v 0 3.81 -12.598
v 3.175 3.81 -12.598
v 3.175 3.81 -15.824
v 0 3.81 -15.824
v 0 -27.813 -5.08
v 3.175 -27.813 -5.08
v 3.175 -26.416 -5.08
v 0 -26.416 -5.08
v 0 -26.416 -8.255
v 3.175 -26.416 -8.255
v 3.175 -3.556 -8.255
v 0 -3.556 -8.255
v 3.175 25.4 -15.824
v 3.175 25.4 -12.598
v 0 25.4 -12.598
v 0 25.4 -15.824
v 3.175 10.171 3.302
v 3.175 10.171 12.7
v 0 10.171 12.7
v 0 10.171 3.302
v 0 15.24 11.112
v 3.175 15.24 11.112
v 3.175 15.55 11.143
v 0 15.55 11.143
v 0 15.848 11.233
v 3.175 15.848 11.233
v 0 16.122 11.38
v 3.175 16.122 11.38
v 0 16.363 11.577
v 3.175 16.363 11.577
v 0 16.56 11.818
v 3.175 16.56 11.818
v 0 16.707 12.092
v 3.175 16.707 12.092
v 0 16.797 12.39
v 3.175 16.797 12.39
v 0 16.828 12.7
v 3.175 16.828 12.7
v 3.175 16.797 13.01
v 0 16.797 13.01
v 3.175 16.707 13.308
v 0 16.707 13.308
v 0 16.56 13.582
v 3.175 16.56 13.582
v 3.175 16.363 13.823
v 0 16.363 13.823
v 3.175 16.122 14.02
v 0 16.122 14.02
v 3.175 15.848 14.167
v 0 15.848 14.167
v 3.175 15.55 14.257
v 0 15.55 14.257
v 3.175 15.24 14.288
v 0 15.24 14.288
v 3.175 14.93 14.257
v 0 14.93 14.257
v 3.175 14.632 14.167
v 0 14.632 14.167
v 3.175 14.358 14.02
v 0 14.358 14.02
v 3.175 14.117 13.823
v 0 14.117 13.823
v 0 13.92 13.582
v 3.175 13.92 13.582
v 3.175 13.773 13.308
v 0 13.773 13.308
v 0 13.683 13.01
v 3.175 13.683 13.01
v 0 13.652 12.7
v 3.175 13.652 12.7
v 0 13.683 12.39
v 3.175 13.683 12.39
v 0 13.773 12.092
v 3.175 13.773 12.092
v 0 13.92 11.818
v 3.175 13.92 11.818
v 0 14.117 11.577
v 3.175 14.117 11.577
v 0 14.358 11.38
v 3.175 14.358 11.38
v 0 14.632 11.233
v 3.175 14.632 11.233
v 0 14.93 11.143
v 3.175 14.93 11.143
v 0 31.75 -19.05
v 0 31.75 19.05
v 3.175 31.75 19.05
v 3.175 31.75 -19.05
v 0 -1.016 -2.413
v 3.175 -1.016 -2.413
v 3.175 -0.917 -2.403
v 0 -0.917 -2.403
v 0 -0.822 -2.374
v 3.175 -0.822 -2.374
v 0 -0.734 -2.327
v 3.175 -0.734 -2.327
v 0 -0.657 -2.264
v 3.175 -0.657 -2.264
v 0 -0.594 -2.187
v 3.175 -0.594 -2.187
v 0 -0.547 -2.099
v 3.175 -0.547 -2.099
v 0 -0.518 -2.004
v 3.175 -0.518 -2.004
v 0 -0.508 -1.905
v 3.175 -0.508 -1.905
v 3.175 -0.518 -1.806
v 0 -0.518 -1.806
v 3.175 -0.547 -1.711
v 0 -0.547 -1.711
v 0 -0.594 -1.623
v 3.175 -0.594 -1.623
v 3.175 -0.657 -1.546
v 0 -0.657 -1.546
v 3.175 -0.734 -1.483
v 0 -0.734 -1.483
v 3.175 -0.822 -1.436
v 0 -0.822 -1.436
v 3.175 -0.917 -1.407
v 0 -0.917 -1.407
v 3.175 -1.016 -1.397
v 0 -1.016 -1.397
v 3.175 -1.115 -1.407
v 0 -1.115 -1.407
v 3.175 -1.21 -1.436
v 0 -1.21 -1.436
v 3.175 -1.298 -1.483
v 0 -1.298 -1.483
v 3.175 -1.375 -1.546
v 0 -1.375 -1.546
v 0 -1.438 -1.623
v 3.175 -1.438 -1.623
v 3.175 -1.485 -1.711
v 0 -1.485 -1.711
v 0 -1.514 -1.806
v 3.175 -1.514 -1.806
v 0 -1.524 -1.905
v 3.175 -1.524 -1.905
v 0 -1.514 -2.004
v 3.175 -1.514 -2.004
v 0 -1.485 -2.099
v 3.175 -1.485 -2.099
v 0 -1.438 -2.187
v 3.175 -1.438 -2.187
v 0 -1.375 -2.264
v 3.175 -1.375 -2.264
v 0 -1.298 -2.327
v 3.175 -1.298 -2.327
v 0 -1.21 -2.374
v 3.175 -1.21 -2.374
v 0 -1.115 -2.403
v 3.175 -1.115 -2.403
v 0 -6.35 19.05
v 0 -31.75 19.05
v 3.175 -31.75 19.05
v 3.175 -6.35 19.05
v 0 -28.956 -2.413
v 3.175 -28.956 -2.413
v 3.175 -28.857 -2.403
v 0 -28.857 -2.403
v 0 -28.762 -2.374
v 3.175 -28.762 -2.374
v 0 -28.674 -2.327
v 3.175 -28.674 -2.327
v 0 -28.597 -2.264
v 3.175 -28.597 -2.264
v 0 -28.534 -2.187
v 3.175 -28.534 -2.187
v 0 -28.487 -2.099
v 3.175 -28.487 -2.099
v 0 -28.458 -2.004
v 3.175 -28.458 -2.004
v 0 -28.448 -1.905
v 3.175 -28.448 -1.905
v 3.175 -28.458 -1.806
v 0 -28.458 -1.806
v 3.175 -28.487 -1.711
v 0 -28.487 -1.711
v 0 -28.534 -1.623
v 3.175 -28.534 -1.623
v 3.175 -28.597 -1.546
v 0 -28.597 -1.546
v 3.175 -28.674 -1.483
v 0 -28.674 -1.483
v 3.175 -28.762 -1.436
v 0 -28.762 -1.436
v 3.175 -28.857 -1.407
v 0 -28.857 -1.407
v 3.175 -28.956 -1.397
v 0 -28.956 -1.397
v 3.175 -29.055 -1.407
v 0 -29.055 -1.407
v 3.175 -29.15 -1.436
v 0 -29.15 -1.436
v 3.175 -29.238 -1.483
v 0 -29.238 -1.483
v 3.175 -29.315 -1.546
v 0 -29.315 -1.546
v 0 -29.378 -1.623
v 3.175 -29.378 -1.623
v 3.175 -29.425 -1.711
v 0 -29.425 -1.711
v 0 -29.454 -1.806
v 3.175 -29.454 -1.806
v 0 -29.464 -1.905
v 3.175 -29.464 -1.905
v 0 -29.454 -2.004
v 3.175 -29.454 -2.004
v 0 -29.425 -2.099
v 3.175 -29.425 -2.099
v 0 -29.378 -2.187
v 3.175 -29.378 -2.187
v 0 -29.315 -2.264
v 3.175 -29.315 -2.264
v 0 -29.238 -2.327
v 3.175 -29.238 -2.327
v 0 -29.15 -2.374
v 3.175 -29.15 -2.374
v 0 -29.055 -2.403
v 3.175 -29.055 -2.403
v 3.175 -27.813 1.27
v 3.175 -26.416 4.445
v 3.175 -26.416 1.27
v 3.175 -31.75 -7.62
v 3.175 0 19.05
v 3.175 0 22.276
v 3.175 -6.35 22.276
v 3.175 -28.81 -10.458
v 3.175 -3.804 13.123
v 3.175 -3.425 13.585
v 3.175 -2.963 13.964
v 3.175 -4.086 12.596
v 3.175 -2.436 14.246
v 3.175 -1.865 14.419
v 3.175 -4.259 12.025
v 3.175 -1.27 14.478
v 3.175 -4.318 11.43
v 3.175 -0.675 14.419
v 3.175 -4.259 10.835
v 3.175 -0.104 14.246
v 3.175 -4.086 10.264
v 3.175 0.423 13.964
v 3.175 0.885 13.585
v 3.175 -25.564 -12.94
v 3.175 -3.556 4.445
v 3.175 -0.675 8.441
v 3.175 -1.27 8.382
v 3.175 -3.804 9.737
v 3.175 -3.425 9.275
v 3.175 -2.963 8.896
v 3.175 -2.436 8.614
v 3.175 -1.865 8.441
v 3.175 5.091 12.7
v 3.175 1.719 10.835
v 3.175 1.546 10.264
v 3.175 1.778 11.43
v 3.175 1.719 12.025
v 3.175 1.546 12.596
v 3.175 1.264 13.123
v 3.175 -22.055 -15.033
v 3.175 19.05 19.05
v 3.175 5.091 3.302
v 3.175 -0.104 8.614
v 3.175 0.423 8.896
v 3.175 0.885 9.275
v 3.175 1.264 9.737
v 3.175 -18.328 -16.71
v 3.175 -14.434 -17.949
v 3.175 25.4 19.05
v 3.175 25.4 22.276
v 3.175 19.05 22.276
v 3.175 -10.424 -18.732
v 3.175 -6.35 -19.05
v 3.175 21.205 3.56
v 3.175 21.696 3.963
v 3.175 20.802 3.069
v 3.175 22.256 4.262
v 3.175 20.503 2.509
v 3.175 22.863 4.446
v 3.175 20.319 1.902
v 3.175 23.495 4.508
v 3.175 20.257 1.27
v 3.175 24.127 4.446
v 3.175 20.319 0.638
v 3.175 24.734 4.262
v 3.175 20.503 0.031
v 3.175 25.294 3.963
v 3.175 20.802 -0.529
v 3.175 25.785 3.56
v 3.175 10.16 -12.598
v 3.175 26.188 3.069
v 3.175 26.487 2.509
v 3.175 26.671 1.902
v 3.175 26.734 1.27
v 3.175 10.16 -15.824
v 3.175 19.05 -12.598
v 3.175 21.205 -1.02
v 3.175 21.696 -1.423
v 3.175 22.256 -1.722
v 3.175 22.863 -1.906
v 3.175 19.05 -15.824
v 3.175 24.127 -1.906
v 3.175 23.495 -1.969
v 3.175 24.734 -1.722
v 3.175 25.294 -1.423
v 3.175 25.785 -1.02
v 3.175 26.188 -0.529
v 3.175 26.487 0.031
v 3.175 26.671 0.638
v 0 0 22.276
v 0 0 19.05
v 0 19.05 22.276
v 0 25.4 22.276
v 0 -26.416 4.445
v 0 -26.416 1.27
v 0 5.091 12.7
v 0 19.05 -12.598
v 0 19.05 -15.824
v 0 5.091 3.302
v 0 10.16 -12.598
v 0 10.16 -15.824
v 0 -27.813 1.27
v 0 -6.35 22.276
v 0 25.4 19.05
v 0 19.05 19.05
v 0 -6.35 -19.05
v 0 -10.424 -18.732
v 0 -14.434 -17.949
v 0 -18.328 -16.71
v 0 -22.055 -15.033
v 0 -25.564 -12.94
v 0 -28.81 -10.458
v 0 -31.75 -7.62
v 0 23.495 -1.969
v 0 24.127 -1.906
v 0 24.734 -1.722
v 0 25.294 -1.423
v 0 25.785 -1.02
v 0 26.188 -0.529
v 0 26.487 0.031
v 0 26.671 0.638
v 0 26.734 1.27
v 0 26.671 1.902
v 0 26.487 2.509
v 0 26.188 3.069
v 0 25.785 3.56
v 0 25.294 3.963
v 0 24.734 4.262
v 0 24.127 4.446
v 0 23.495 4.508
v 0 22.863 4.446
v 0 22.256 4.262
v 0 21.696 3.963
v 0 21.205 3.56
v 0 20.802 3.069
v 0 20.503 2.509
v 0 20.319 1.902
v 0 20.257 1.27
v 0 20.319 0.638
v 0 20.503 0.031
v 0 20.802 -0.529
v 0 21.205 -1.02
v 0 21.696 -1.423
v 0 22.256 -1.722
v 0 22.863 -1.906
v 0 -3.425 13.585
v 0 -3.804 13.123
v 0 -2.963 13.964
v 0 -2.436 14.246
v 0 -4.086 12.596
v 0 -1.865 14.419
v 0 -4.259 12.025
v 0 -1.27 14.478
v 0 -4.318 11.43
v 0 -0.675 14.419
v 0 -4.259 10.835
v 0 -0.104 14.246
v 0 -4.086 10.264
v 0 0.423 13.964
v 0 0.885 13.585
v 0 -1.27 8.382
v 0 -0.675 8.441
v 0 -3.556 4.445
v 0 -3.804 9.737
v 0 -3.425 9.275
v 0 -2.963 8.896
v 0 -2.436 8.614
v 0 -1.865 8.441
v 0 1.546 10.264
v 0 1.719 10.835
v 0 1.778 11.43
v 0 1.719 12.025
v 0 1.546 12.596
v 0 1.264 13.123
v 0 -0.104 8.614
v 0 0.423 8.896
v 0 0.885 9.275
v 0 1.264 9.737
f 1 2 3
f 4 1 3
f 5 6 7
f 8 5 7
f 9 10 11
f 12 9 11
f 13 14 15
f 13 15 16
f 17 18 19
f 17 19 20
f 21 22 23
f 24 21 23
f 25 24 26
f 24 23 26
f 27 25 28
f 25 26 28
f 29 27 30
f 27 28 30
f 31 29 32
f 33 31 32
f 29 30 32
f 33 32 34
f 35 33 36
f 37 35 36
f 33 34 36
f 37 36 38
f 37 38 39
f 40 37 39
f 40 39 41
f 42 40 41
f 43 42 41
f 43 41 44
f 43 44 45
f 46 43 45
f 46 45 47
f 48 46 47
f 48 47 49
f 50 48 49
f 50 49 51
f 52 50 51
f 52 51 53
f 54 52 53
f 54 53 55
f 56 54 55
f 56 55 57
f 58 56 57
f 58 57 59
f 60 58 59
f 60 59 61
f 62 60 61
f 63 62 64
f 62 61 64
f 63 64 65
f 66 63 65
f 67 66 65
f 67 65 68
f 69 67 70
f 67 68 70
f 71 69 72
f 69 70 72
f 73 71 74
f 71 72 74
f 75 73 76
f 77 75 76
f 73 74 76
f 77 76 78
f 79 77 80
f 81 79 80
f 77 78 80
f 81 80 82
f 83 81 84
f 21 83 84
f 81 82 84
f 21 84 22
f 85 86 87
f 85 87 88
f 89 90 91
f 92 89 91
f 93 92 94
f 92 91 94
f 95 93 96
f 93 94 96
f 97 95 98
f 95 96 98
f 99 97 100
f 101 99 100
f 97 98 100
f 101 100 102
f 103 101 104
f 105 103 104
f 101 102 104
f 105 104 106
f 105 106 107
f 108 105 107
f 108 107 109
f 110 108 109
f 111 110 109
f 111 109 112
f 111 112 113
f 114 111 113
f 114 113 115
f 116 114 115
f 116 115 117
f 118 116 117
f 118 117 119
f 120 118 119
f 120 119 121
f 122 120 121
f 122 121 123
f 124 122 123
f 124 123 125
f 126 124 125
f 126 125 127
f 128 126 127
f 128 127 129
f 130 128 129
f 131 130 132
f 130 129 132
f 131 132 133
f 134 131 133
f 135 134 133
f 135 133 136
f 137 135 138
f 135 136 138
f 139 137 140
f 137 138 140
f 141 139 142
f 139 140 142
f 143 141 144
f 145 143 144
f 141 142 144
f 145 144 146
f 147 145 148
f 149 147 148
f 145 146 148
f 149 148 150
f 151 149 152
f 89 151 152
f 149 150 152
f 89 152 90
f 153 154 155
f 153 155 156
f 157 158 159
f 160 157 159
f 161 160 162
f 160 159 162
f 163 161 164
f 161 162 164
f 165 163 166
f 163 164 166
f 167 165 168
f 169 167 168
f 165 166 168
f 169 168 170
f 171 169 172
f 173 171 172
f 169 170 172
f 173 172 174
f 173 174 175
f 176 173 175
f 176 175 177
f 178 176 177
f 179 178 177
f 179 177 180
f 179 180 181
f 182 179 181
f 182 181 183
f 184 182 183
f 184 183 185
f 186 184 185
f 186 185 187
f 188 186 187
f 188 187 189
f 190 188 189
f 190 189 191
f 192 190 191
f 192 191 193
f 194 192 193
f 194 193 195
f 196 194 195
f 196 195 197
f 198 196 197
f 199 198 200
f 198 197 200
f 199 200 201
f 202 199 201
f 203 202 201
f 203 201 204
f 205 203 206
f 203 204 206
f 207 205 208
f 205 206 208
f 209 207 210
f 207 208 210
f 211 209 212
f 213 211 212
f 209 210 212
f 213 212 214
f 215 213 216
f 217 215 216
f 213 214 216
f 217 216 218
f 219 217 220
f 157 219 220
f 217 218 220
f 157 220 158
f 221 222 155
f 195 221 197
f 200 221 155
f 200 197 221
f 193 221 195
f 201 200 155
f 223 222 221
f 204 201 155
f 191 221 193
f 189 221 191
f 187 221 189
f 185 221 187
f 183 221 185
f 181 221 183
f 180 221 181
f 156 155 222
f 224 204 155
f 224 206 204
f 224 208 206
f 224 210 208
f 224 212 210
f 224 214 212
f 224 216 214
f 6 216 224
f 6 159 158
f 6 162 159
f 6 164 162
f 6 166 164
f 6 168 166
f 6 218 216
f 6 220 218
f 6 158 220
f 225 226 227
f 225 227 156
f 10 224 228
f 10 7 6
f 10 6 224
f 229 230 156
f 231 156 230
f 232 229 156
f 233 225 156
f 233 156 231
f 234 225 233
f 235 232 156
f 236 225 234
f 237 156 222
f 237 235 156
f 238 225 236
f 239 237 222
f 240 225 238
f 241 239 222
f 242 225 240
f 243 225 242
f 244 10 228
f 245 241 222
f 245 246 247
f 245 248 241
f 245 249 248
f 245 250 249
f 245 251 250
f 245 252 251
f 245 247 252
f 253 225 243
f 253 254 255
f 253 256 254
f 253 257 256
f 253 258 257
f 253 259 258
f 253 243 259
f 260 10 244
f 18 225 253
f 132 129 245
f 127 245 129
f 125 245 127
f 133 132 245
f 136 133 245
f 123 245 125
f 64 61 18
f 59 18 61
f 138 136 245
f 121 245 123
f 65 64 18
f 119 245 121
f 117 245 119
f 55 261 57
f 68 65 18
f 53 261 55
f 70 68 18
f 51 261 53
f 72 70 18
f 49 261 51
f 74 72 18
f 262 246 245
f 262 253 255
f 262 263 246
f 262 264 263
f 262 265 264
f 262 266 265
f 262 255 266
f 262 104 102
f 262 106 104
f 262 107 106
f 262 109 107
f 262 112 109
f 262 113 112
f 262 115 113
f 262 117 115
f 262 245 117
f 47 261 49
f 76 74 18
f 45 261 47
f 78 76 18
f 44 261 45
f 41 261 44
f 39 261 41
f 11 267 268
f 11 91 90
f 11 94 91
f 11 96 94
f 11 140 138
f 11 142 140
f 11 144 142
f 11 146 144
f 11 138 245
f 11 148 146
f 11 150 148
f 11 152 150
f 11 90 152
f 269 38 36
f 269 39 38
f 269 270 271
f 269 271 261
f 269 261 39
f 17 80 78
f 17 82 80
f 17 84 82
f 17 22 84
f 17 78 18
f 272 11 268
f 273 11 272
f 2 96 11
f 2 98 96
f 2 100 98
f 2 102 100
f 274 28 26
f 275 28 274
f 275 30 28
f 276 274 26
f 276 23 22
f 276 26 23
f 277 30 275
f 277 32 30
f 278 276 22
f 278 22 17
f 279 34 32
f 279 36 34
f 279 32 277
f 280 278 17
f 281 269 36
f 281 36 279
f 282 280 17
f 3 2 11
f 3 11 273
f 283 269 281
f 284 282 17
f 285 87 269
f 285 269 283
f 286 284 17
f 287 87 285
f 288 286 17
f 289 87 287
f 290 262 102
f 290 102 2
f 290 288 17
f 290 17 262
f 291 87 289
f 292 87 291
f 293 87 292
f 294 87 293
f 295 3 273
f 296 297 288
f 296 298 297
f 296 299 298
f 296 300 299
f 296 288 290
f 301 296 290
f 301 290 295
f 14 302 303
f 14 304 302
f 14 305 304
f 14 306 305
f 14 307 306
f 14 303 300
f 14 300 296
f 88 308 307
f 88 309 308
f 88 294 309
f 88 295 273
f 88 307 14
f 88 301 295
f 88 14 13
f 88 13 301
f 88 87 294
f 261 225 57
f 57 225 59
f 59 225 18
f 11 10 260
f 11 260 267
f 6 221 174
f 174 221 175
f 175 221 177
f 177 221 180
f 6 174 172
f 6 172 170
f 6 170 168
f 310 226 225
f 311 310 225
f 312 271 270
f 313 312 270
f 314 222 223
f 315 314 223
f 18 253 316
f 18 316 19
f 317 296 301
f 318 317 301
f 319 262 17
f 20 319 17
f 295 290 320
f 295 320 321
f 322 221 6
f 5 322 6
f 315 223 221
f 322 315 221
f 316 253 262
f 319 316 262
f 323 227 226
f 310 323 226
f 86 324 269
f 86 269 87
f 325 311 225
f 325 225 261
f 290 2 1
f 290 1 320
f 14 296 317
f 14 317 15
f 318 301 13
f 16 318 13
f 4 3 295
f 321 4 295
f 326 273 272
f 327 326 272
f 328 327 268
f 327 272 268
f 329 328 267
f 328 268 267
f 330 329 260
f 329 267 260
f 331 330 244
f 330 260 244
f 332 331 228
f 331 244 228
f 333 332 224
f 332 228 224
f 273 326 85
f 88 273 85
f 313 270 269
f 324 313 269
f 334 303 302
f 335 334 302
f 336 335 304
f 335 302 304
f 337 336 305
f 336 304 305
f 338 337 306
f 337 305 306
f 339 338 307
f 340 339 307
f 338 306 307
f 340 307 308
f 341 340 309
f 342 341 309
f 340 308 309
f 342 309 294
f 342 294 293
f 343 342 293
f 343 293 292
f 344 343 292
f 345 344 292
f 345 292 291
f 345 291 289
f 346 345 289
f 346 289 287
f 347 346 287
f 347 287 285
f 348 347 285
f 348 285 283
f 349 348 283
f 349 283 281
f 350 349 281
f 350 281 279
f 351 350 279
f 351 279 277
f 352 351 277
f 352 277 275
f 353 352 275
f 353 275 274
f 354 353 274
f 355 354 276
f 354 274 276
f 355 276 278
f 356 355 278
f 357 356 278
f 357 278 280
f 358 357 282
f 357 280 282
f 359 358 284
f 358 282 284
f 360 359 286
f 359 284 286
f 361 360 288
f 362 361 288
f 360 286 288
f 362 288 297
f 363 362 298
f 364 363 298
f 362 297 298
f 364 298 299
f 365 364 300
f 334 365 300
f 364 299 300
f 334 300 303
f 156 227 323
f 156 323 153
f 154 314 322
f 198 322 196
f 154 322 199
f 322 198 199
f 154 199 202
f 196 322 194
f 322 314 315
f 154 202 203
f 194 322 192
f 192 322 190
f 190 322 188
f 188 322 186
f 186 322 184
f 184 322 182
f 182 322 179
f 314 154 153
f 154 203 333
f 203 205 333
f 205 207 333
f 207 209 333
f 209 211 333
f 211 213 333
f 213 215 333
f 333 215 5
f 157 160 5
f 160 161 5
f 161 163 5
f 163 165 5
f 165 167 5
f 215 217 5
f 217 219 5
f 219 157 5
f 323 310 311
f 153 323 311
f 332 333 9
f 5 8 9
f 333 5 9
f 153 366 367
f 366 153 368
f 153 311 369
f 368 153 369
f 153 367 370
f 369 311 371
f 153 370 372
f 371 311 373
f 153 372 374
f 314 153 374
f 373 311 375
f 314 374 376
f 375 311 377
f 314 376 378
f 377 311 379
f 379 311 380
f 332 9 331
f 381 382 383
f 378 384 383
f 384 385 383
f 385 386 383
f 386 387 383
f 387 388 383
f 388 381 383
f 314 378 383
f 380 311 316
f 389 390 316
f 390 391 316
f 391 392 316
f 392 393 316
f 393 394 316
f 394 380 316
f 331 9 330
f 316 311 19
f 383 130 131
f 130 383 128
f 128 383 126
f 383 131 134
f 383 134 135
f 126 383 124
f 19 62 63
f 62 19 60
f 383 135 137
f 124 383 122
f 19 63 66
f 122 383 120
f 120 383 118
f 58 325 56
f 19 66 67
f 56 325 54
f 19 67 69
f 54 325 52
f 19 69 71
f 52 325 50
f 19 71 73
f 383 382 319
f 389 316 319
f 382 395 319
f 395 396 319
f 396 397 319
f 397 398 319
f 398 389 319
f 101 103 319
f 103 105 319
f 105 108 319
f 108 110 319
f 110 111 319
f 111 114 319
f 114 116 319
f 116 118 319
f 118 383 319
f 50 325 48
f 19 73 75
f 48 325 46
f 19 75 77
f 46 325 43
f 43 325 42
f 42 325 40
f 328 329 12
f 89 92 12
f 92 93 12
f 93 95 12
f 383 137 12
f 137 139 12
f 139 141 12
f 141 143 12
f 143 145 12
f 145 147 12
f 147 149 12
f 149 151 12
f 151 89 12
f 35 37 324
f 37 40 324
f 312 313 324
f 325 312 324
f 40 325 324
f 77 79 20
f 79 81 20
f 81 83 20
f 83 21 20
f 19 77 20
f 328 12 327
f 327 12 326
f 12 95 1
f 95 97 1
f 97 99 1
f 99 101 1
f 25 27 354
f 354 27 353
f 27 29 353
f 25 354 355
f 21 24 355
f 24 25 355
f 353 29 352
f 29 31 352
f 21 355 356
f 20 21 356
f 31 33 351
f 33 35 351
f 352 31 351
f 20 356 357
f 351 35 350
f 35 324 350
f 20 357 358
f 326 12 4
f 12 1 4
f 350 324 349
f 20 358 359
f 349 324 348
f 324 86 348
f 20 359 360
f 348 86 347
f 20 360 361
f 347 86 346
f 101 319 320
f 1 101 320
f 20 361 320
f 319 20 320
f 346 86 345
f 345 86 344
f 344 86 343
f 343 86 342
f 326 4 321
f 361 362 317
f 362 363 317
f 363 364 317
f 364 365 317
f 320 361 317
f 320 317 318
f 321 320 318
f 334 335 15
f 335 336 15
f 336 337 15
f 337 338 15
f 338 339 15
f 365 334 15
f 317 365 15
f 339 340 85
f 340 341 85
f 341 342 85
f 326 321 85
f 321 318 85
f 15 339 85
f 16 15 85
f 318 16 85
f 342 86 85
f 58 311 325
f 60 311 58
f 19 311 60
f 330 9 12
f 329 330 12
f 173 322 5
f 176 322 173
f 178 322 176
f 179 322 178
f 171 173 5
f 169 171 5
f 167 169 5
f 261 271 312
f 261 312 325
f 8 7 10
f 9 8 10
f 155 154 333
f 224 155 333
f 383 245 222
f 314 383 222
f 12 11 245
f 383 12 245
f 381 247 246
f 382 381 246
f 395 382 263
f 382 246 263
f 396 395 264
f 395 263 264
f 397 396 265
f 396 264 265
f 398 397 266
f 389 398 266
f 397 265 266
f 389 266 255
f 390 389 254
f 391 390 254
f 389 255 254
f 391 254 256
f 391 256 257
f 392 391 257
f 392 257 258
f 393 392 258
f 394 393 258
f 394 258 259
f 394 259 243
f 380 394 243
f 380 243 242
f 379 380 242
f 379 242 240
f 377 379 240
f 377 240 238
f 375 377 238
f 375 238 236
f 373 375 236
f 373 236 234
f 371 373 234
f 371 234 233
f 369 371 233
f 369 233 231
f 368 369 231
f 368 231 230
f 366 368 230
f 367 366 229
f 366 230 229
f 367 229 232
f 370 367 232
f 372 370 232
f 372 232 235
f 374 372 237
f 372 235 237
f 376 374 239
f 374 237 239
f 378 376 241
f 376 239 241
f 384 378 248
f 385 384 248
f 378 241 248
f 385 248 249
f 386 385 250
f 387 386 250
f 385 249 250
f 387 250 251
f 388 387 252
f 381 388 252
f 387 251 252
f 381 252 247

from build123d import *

# Parameters (mm, degrees)
SKETCH1_W                          = 38.1
SKETCH1_H                          = 63.5
MAIN_BODY_DEPTH                    = 3.175
SKETCH2_W                          = 3.2258
SKETCH2_H                          = 6.35
TABS_DEPTH                         = 3.175
SKETCH5_R                          = 0.508
MOTOR_CUT_DEPTH                    = 4.175
SKETCH6_R                          = 3.2385
CUT_FOR_AXLE_DEPTH                 = 4.175
ROUND_OFF_BACK_CORNER_DEPTH        = 4.175
SKETCH8_W                          = 3.2258
SKETCH8_H                          = 6.35
CUT_FOR_TABS_DEPTH                 = 4.175
SKETCH9_R                          = 1.5875
CUT_FOR_BRACKET_SCREW_DEPTH        = 4.175
SKETCH10_R                         = 3.048
CUT_FOR_BASIC_2ND_MOUNT_AXLE_DEPTH = 4.175
SKETCH11_W                         = 9.398
SKETCH11_H                         = 5.08
CUT_EXTRUDE1_DEPTH                 = 4.175


with BuildPart() as part:
    # Sketch1 → main body (new body)
    with BuildSketch(Plane(origin=(0, 0, 0), x_dir=(0, 0, -1), z_dir=(1, 0, 0))):
        Rectangle(SKETCH1_W, SKETCH1_H)
    extrude(amount=MAIN_BODY_DEPTH)

    # Sketch2 → tabs (add)
    with BuildSketch(Plane(origin=(3.175, 0, 0), x_dir=(0, 0, -1), z_dir=(1, 0, 0))):
        with Locations((-20.6629, 22.225)):
            Rectangle(SKETCH2_W, SKETCH2_H)
        with Locations((-20.6629, -3.175)):
            Rectangle(SKETCH2_W, SKETCH2_H)
    extrude(amount=-TABS_DEPTH)

    # Sketch5 → motor cut (cut, through all)
    with BuildSketch(Plane(origin=(3.175, 0, 0), x_dir=(0, 0, -1), z_dir=(1, 0, 0))):
        with Locations((1.905, -28.956)):
            Circle(SKETCH5_R)
        with Locations((1.905, -1.016)):
            Circle(SKETCH5_R)
        Polygon((8.255, -3.556), (-4.445, -3.556), (-4.445, -26.416), (-1.27, -26.416), (-1.27, -27.813), (5.08, -27.813), (5.08, -26.416), (8.255, -26.416), align=None)
    extrude(amount=-MOTOR_CUT_DEPTH, mode=Mode.SUBTRACT)

    # Sketch6 → cut for axle (cut, through all)
    with BuildSketch(Plane(origin=(3.175, 0, 0), x_dir=(0, 0, -1), z_dir=(1, 0, 0))):
        with Locations((-1.27, 23.495)):
            Circle(SKETCH6_R)
    extrude(amount=-CUT_FOR_AXLE_DEPTH, mode=Mode.SUBTRACT)

    # Sketch7 → round off back corner (cut, through all)
    with BuildSketch(Plane(origin=(3.175, 0, 0), x_dir=(0, 0, -1), z_dir=(1, 0, 0))):
        with BuildLine():
            Line((19.05, -31.75), (19.05, -6.35))
            ThreePointArc((19.05, -6.35), (15.925359096, -20.215661593), (7.62, -31.75))
            Line((7.62, -31.75), (19.05, -31.75))
        make_face()
    extrude(amount=-ROUND_OFF_BACK_CORNER_DEPTH, mode=Mode.SUBTRACT)

    # Sketch8 → cut for tabs (cut, through all)
    with BuildSketch(Plane(origin=(3.175, 0, 0), x_dir=(0, 0, -1), z_dir=(1, 0, 0))):
        with Locations((14.2113, 22.225)):
            Rectangle(SKETCH8_W, SKETCH8_H)
        with Locations((14.2113, 6.985)):
            Rectangle(SKETCH8_W, SKETCH8_H)
    extrude(amount=-CUT_FOR_TABS_DEPTH, mode=Mode.SUBTRACT)

    # Sketch9 → cut for bracket screw (cut, through all)
    with BuildSketch(Plane(origin=(3.175, 0, 0), x_dir=(0, 0, -1), z_dir=(1, 0, 0))):
        with Locations((-12.7, 15.24)):
            Circle(SKETCH9_R)
    extrude(amount=-CUT_FOR_BRACKET_SCREW_DEPTH, mode=Mode.SUBTRACT)

    # Sketch10 → cut for basic 2nd mount axle (cut, through all)
    with BuildSketch(Plane(origin=(3.175, 0, 0), x_dir=(0, 0, -1), z_dir=(1, 0, 0))):
        with Locations((-11.43, -1.27)):
            Circle(SKETCH10_R)
    extrude(amount=-CUT_FOR_BASIC_2ND_MOUNT_AXLE_DEPTH, mode=Mode.SUBTRACT)

    # Sketch11 → Cut-Extrude1 (cut, through all)
    with BuildSketch(Plane(origin=(3.175, 0, 0), x_dir=(0, 0, -1), z_dir=(1, 0, 0))):
        with Locations((-8.001, 7.630964138)):
            Rectangle(SKETCH11_W, SKETCH11_H)
    extrude(amount=-CUT_EXTRUDE1_DEPTH, mode=Mode.SUBTRACT)


solid = part.part
